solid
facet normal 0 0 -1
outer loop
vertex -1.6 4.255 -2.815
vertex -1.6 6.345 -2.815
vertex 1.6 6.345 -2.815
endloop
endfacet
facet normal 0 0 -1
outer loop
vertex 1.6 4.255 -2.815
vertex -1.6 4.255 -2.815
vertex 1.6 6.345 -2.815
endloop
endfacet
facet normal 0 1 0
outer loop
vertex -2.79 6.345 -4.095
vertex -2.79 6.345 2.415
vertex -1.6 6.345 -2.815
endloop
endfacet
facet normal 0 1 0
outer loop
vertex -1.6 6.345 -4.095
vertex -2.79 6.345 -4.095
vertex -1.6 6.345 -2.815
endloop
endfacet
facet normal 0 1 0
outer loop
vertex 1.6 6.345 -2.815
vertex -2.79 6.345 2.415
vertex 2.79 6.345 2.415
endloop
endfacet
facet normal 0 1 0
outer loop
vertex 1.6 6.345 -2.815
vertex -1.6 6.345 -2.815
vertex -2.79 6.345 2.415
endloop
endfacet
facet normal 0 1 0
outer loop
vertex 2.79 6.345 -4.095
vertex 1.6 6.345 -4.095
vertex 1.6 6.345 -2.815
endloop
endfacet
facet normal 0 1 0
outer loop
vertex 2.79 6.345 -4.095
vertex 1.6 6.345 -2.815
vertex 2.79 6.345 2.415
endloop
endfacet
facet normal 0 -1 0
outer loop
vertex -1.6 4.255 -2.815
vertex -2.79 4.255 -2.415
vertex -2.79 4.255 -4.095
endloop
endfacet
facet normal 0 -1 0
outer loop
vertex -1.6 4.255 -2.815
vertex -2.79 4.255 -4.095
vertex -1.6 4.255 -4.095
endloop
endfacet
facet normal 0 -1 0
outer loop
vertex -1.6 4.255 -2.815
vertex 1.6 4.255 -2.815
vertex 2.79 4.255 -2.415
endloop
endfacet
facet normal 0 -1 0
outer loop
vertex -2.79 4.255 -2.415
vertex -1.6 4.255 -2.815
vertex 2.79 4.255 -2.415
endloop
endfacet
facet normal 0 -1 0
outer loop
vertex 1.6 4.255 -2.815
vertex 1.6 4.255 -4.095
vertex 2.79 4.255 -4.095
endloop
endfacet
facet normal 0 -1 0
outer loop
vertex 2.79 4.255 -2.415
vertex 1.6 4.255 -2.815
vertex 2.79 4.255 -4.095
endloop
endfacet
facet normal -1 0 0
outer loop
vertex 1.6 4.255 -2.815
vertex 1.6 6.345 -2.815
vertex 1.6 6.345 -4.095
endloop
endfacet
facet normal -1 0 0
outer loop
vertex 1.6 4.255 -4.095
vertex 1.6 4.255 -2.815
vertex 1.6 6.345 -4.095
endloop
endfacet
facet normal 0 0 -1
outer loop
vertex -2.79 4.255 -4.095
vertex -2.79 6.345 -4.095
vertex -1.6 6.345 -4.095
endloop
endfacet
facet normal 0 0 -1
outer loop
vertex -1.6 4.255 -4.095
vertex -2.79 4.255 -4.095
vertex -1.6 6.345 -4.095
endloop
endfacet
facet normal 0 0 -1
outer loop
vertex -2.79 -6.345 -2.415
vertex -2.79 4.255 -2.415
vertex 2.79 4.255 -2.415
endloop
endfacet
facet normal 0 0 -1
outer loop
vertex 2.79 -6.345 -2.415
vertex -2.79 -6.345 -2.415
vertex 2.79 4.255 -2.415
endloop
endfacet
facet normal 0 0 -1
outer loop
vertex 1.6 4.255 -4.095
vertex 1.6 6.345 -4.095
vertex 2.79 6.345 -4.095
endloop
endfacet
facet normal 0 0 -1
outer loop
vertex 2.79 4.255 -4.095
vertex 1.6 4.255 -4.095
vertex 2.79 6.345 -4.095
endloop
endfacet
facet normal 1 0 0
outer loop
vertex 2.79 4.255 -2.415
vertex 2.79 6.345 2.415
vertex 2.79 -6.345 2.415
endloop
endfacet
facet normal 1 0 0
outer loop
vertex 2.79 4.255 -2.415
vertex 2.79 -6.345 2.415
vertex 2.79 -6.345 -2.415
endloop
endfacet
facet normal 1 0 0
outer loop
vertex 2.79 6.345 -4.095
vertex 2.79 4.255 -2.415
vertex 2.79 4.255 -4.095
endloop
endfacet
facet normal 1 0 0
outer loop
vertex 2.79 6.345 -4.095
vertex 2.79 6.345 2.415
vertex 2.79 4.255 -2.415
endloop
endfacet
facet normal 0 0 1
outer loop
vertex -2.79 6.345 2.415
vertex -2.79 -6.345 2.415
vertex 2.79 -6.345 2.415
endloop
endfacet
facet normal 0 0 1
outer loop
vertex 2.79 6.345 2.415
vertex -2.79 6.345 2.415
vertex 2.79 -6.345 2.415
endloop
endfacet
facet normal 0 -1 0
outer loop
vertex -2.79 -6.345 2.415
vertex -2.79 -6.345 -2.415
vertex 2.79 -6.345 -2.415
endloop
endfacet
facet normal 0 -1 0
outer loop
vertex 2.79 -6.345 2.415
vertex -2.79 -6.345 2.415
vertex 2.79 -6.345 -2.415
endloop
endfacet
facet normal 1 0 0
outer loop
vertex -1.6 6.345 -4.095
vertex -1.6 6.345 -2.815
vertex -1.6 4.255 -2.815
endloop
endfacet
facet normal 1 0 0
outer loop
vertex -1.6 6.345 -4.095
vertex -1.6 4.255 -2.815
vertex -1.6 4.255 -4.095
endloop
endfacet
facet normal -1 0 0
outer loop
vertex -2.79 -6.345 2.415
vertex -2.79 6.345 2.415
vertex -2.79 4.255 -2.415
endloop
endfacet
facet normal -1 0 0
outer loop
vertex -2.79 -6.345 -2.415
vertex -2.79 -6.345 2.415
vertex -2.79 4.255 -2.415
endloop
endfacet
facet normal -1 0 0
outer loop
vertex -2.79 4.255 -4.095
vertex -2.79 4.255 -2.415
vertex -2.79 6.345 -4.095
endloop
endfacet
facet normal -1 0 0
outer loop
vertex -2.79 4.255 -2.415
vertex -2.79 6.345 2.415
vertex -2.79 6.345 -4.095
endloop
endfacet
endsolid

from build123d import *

# Parameters (mm, degrees)
SKETCH1_W           = 5.58
SKETCH1_H           = 4.83
BOSS_EXTRUDE1_DEPTH = 6.345
SKETCH2_W           = 1.19
SKETCH2_H           = 1.68
BOSS_EXTRUDE2_DEPTH = 2.09
SKETCH4_W           = 3.2
SKETCH4_H           = 0.4
BOSS_EXTRUDE3_DEPTH = 2.09


with BuildPart() as part:
    # Sketch1 → Boss-Extrude1 (new, symmetric)
    with BuildSketch(Plane(origin=(0, 0, 0), x_dir=(1, 0, 0), z_dir=(0, 1, 0))):
        Rectangle(SKETCH1_W, SKETCH1_H)
    extrude(amount=BOSS_EXTRUDE1_DEPTH, both=True)

    # Sketch2 → Boss-Extrude2 (add)
    with BuildSketch(Plane(origin=(0, 6.345, 0), x_dir=(1, 0, 0), z_dir=(0, 1, 0))):
        with Locations((-2.195, 3.255)):
            Rectangle(SKETCH2_W, SKETCH2_H)
        with Locations((2.195, 3.255)):
            Rectangle(SKETCH2_W, SKETCH2_H)
    extrude(amount=-BOSS_EXTRUDE2_DEPTH)

    # Sketch4 → Boss-Extrude3 (add)
    with BuildSketch(Plane(origin=(0, 6.345, 0), x_dir=(1, 0, 0), z_dir=(0, 1, 0))):
        with Locations((0, 2.615)):
            Rectangle(SKETCH4_W, SKETCH4_H)
    extrude(amount=-BOSS_EXTRUDE3_DEPTH)


solid = part.part
